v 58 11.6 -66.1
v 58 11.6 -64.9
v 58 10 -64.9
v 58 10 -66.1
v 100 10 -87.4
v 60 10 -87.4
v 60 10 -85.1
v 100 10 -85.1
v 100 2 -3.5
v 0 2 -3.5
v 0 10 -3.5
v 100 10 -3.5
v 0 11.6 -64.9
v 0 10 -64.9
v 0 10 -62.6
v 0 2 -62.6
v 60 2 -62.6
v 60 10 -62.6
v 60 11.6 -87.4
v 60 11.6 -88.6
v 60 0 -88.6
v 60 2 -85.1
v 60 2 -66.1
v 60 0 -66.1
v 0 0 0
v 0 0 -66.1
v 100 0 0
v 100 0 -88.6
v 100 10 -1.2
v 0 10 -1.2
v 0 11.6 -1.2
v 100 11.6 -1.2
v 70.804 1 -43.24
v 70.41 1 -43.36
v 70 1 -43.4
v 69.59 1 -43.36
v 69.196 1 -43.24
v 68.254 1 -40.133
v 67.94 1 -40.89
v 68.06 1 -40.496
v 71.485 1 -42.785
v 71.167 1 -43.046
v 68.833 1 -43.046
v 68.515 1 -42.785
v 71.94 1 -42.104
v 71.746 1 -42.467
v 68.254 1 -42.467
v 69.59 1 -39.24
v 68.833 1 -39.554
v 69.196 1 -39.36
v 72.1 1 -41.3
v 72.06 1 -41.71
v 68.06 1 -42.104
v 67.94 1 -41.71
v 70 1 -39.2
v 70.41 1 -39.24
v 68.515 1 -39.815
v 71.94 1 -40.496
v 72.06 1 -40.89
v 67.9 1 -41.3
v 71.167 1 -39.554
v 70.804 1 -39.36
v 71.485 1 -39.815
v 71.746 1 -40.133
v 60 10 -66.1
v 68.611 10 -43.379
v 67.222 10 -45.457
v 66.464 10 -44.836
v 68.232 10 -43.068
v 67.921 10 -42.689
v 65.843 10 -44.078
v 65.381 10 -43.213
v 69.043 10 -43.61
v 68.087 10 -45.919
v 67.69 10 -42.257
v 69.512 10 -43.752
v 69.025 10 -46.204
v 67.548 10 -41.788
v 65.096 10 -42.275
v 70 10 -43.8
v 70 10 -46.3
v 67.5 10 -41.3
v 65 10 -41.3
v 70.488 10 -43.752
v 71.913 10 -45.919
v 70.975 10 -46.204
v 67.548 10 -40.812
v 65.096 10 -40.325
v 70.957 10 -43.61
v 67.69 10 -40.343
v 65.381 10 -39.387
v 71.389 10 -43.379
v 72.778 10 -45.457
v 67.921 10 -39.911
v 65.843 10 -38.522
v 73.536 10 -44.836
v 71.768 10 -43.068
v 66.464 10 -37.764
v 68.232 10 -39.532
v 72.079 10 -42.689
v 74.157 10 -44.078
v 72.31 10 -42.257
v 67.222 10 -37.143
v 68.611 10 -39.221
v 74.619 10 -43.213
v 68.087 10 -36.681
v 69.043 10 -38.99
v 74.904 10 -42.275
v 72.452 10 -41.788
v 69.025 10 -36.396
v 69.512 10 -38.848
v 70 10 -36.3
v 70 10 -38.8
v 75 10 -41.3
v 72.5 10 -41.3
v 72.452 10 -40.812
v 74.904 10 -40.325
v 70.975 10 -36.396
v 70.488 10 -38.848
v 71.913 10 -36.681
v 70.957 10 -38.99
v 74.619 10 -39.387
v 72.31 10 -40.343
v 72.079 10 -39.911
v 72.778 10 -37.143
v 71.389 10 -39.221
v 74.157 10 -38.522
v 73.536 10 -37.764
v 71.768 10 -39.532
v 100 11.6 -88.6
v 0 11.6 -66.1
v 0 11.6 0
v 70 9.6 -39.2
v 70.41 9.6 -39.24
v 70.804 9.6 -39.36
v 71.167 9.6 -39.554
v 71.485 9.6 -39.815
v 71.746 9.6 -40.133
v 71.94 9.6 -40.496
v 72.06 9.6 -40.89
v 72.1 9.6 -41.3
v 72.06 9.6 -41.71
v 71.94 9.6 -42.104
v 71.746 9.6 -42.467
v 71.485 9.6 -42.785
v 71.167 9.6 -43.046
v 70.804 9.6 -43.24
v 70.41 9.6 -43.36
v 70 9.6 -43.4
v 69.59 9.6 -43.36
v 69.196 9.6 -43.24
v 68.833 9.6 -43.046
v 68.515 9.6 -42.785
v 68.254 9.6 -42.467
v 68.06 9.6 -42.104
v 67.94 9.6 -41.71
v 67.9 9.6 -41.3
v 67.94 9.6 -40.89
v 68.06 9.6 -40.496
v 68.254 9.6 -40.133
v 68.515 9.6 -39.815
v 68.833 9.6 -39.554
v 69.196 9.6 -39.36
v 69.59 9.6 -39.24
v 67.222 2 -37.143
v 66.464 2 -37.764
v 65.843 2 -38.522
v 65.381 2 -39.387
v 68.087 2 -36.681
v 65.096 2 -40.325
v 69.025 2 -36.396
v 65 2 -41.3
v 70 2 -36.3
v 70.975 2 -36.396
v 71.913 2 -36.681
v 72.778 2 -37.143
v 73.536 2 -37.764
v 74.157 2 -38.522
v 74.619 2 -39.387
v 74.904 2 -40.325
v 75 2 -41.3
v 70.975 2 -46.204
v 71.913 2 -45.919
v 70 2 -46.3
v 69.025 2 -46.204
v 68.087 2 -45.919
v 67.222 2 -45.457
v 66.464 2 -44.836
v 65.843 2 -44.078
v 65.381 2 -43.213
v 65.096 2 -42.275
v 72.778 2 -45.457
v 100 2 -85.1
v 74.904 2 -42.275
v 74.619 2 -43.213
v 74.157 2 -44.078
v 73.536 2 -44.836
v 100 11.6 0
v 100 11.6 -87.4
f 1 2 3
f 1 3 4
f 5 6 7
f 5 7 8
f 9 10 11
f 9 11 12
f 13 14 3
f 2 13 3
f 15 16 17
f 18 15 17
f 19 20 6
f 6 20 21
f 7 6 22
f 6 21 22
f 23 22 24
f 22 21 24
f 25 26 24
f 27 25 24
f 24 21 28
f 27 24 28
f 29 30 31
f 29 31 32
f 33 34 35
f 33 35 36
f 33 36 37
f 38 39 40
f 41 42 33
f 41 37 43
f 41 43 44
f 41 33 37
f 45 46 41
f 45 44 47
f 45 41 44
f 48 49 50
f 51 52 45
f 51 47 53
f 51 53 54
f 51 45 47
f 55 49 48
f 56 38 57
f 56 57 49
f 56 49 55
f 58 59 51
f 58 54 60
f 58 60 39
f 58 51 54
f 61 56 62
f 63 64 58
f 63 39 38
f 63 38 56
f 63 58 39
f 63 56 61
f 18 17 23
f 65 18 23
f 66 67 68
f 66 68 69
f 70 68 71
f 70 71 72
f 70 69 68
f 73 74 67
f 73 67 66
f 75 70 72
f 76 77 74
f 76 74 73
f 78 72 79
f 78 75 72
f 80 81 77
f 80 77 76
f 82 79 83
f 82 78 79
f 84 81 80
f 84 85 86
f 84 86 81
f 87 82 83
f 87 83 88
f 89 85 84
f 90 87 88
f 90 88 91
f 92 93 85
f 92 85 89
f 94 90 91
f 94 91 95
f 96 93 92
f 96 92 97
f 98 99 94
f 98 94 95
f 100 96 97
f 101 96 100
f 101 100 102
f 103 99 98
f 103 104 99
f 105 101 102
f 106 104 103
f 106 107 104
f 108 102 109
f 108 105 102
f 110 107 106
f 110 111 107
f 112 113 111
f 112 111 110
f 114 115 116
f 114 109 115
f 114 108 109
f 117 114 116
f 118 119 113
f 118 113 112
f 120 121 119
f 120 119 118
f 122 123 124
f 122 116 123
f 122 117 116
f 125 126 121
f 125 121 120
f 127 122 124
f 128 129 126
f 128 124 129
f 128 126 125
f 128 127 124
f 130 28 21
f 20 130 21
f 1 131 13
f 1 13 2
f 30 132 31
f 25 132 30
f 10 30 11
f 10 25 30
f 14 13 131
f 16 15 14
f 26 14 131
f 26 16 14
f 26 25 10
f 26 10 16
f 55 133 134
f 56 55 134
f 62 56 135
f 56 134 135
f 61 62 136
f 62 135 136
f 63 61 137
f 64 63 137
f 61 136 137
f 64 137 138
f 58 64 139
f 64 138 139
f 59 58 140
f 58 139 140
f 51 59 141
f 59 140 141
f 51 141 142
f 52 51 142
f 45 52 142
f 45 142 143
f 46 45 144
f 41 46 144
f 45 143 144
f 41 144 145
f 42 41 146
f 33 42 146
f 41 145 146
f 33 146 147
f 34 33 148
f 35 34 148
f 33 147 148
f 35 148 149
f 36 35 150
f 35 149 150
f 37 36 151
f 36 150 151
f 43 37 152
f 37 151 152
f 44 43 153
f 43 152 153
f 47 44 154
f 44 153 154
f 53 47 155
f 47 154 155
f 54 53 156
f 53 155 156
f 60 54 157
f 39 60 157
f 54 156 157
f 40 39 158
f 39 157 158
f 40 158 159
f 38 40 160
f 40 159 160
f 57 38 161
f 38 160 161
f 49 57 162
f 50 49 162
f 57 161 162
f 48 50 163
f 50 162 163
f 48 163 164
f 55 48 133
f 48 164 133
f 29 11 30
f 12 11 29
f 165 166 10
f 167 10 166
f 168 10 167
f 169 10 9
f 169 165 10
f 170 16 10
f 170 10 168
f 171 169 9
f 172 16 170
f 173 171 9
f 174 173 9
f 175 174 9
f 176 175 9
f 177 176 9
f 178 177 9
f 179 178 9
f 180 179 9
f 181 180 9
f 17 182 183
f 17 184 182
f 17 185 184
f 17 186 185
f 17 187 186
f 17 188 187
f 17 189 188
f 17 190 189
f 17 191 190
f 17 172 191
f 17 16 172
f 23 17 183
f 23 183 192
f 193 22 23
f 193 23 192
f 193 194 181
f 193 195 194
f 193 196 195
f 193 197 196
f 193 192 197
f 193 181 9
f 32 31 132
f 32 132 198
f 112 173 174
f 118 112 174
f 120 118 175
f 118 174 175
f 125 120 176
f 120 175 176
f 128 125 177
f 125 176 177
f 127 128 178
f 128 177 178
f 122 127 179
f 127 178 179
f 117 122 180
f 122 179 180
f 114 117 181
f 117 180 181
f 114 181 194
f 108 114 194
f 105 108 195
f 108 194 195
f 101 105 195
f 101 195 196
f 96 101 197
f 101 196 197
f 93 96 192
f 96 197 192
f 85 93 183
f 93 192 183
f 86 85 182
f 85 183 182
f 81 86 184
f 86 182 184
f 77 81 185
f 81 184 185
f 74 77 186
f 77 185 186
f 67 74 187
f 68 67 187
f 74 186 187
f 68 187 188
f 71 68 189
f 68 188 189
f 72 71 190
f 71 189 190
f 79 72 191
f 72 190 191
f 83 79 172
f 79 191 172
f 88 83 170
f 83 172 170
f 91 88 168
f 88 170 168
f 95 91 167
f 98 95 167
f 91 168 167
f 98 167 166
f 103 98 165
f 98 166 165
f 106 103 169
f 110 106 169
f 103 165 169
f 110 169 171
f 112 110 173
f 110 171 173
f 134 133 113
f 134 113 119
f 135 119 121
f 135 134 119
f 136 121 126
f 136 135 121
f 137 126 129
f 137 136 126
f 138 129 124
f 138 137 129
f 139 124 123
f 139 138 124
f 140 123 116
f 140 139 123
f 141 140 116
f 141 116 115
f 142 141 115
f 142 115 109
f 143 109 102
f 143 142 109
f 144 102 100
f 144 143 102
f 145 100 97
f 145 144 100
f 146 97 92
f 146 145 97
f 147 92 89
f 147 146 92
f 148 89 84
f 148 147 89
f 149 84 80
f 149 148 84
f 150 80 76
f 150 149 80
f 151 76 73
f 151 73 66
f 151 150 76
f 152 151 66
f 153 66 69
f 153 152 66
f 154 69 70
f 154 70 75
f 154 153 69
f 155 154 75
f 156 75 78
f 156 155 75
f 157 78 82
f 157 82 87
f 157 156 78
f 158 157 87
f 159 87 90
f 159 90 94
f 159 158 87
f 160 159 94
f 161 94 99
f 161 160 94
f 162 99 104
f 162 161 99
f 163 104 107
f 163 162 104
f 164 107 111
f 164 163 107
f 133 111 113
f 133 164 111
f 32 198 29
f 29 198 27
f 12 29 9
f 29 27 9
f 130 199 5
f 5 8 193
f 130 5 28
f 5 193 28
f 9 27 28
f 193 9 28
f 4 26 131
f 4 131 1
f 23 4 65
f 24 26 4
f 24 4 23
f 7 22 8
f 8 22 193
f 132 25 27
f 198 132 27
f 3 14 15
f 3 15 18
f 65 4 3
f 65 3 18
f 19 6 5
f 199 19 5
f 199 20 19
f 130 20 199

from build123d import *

# Parameters (mm, degrees)
AUFSATZ_LINEAR_AUSTRAGEN1_DEPTH = 2
SKIZZE2_R                       = 5
SKIZZE2_W                       = 60
SKIZZE2_H                       = 3.5
SKIZZE2_W_2                     = 40
SKIZZE2_W_3                     = 100
AUFSATZ_LINEAR_AUSTRAGEN2_DEPTH = 8
SKIZZE3_R                       = 2.1
SCHNITT_LINEAR_AUSTRAGEN1_DEPTH = 9
FASE1_SIZE                      = 0.4
SKIZZE4_W                       = 58
SKIZZE4_H                       = 1.2
SKIZZE4_W_2                     = 40
SKIZZE4_W_3                     = 100
AUFSATZ_LINEAR_AUSTRAGEN3_DEPTH = 1.6


with BuildPart() as part:
    # Skizze1 → Aufsatz-Linear austragen1 (new body)
    with BuildSketch(Plane(origin=(0, 0, 0), x_dir=(1, 0, 0), z_dir=(0, 1, 0))):
        Polygon((0, 66.1), (0, 0), (100, 0), (100, 88.6), (60, 88.6), (60, 66.1), align=None)
    extrude(amount=AUFSATZ_LINEAR_AUSTRAGEN1_DEPTH)

    # Skizze2 → Aufsatz-Linear austragen2 (add)
    with BuildSketch(Plane(origin=(0, 2, 0), x_dir=(1, 0, 0), z_dir=(0, 1, 0))):
        with Locations(Location((70, 41.3, 0), (0, 0, 270))):
            Circle(SKIZZE2_R)
        with Locations((30, 64.35)):
            Rectangle(SKIZZE2_W, SKIZZE2_H)
        with Locations((80, 86.85)):
            Rectangle(SKIZZE2_W_2, SKIZZE2_H)
        with Locations((50, 1.75)):
            Rectangle(SKIZZE2_W_3, SKIZZE2_H)
    extrude(amount=AUFSATZ_LINEAR_AUSTRAGEN2_DEPTH)

    # Skizze3 → Schnitt-Linear austragen1 (cut)
    with BuildSketch(Plane(origin=(0, 10, 0), x_dir=(1, 0, 0), z_dir=(0, 1, 0))):
        with Locations(Location((70, 41.3, 0), (0, 0, 270))):
            Circle(SKIZZE3_R)
    extrude(amount=-SCHNITT_LINEAR_AUSTRAGEN1_DEPTH, mode=Mode.SUBTRACT)

    # Fase1
    fase1_edges = [part.edges().sort_by_distance(p)[0] for p in [
        (70, 10, -43.4),
    ]]
    chamfer(fase1_edges, length=FASE1_SIZE)

    # Skizze4 → Aufsatz-Linear austragen3 (add)
    with BuildSketch(Plane(origin=(0, 10, 0), x_dir=(1, 0, 0), z_dir=(0, 1, 0))):
        with Locations((29, 65.5)):
            Rectangle(SKIZZE4_W, SKIZZE4_H)
        with Locations((80, 88)):
            Rectangle(SKIZZE4_W_2, SKIZZE4_H)
        with Locations((50, 0.6)):
            Rectangle(SKIZZE4_W_3, SKIZZE4_H)
    extrude(amount=AUFSATZ_LINEAR_AUSTRAGEN3_DEPTH)


solid = part.part
